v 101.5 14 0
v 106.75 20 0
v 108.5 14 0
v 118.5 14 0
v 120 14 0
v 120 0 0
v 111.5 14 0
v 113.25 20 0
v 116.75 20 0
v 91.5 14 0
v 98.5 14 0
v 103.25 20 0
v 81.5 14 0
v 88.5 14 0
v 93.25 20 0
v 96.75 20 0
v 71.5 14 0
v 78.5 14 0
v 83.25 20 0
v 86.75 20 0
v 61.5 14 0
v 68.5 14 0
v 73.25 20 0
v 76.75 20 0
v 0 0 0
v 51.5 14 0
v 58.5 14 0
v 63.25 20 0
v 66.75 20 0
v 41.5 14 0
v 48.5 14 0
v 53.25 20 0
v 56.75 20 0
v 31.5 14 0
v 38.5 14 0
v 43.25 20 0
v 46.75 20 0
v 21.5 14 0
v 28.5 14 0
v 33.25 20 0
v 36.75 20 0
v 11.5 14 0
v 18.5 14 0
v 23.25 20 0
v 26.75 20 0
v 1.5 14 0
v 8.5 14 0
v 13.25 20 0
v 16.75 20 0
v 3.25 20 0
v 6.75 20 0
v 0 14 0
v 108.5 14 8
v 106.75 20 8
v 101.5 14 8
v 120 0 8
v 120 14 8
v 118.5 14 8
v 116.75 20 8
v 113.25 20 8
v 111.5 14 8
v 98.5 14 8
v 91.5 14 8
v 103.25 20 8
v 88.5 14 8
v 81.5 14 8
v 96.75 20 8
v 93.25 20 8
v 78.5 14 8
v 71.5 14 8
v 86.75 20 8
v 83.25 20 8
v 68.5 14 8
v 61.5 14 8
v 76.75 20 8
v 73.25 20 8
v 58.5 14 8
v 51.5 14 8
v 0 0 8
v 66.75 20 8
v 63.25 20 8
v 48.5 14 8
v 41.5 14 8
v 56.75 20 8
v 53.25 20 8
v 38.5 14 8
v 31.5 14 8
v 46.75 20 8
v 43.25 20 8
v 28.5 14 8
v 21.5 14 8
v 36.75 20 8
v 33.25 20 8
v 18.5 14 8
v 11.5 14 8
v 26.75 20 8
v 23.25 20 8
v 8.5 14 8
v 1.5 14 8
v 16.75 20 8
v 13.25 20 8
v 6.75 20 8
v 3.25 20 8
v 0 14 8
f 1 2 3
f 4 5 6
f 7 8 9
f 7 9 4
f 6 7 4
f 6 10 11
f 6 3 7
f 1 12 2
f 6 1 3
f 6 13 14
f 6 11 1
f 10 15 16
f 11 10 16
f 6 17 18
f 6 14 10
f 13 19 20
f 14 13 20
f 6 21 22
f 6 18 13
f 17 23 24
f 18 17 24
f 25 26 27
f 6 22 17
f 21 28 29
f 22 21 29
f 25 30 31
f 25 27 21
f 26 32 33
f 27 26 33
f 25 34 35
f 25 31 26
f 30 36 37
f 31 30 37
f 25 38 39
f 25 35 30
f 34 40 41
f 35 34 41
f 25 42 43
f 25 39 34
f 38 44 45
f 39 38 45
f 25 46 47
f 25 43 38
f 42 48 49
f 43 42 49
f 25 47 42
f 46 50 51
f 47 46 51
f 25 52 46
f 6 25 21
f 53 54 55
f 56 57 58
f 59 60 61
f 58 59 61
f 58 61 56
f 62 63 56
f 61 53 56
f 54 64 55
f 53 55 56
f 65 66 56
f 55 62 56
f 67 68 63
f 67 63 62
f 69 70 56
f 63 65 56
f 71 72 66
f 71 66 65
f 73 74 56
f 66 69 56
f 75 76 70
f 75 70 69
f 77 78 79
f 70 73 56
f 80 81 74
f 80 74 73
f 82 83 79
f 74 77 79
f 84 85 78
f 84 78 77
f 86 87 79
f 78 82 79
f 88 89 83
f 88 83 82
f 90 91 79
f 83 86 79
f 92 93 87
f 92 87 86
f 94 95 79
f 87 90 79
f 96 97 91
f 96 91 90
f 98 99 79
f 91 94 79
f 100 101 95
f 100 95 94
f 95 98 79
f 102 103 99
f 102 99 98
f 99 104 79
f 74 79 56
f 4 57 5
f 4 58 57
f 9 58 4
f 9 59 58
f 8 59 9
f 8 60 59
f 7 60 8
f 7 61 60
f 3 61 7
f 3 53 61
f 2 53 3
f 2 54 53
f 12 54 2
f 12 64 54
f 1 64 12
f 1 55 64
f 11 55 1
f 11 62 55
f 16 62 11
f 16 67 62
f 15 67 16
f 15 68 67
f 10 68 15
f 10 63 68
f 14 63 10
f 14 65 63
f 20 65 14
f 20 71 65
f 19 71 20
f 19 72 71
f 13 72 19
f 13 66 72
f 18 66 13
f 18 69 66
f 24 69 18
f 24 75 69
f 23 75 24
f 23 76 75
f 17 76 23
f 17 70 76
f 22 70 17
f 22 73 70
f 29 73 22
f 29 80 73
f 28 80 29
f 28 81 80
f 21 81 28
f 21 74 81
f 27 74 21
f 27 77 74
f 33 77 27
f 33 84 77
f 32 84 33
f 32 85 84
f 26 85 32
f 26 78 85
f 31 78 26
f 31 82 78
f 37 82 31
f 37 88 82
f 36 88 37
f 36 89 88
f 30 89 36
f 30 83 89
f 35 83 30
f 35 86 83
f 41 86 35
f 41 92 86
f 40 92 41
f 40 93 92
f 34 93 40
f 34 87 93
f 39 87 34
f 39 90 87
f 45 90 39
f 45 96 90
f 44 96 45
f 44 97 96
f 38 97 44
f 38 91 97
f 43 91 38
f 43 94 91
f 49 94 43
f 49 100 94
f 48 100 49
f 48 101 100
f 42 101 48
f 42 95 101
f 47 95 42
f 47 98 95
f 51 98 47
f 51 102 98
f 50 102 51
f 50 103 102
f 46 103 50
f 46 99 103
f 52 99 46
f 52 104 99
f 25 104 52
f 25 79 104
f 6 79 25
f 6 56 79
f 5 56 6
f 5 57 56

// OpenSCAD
$fn = 32;

// ----------------------------------------------------------------------
// Gear rack: 12 teeth, pitch 10 mm
// ----------------------------------------------------------------------

// --- parameters (mm) ---
teeth = 12;               // number of teeth
pitch = 10;               // tooth pitch, X
root_w = 7;               // tooth width at the root
tip_w = 3.5;              // tooth width at the tip
base_h = 14;              // rack body height, Y
tooth_h = 6;              // tooth height above the body
plate_t = 8;              // rack width, Z (extrusion height)

rack_l = teeth * pitch;  // overall length
total_h = base_h + tooth_h;  // overall height

profile = [[0, 0], [120, 0], [120, 14], [118.5, 14], [116.75, 20], [113.25, 20], [111.5, 14], [108.5, 14], [106.75, 20], [103.25, 20], [101.5, 14], [98.5, 14], [96.75, 20], [93.25, 20], [91.5, 14], [88.5, 14], [86.75, 20], [83.25, 20], [81.5, 14], [78.5, 14], [76.75, 20], [73.25, 20], [71.5, 14], [68.5, 14], [66.75, 20], [63.25, 20], [61.5, 14], [58.5, 14], [56.75, 20], [53.25, 20], [51.5, 14], [48.5, 14], [46.75, 20], [43.25, 20], [41.5, 14], [38.5, 14], [36.75, 20], [33.25, 20], [31.5, 14], [28.5, 14], [26.75, 20], [23.25, 20], [21.5, 14], [18.5, 14], [16.75, 20], [13.25, 20], [11.5, 14], [8.5, 14], [6.75, 20], [3.25, 20], [1.5, 14], [0, 14]];  // primary outline, 52 points, counter clockwise

// --- the one profile operation ---
linear_extrude(height = plate_t) polygon(points = profile);
